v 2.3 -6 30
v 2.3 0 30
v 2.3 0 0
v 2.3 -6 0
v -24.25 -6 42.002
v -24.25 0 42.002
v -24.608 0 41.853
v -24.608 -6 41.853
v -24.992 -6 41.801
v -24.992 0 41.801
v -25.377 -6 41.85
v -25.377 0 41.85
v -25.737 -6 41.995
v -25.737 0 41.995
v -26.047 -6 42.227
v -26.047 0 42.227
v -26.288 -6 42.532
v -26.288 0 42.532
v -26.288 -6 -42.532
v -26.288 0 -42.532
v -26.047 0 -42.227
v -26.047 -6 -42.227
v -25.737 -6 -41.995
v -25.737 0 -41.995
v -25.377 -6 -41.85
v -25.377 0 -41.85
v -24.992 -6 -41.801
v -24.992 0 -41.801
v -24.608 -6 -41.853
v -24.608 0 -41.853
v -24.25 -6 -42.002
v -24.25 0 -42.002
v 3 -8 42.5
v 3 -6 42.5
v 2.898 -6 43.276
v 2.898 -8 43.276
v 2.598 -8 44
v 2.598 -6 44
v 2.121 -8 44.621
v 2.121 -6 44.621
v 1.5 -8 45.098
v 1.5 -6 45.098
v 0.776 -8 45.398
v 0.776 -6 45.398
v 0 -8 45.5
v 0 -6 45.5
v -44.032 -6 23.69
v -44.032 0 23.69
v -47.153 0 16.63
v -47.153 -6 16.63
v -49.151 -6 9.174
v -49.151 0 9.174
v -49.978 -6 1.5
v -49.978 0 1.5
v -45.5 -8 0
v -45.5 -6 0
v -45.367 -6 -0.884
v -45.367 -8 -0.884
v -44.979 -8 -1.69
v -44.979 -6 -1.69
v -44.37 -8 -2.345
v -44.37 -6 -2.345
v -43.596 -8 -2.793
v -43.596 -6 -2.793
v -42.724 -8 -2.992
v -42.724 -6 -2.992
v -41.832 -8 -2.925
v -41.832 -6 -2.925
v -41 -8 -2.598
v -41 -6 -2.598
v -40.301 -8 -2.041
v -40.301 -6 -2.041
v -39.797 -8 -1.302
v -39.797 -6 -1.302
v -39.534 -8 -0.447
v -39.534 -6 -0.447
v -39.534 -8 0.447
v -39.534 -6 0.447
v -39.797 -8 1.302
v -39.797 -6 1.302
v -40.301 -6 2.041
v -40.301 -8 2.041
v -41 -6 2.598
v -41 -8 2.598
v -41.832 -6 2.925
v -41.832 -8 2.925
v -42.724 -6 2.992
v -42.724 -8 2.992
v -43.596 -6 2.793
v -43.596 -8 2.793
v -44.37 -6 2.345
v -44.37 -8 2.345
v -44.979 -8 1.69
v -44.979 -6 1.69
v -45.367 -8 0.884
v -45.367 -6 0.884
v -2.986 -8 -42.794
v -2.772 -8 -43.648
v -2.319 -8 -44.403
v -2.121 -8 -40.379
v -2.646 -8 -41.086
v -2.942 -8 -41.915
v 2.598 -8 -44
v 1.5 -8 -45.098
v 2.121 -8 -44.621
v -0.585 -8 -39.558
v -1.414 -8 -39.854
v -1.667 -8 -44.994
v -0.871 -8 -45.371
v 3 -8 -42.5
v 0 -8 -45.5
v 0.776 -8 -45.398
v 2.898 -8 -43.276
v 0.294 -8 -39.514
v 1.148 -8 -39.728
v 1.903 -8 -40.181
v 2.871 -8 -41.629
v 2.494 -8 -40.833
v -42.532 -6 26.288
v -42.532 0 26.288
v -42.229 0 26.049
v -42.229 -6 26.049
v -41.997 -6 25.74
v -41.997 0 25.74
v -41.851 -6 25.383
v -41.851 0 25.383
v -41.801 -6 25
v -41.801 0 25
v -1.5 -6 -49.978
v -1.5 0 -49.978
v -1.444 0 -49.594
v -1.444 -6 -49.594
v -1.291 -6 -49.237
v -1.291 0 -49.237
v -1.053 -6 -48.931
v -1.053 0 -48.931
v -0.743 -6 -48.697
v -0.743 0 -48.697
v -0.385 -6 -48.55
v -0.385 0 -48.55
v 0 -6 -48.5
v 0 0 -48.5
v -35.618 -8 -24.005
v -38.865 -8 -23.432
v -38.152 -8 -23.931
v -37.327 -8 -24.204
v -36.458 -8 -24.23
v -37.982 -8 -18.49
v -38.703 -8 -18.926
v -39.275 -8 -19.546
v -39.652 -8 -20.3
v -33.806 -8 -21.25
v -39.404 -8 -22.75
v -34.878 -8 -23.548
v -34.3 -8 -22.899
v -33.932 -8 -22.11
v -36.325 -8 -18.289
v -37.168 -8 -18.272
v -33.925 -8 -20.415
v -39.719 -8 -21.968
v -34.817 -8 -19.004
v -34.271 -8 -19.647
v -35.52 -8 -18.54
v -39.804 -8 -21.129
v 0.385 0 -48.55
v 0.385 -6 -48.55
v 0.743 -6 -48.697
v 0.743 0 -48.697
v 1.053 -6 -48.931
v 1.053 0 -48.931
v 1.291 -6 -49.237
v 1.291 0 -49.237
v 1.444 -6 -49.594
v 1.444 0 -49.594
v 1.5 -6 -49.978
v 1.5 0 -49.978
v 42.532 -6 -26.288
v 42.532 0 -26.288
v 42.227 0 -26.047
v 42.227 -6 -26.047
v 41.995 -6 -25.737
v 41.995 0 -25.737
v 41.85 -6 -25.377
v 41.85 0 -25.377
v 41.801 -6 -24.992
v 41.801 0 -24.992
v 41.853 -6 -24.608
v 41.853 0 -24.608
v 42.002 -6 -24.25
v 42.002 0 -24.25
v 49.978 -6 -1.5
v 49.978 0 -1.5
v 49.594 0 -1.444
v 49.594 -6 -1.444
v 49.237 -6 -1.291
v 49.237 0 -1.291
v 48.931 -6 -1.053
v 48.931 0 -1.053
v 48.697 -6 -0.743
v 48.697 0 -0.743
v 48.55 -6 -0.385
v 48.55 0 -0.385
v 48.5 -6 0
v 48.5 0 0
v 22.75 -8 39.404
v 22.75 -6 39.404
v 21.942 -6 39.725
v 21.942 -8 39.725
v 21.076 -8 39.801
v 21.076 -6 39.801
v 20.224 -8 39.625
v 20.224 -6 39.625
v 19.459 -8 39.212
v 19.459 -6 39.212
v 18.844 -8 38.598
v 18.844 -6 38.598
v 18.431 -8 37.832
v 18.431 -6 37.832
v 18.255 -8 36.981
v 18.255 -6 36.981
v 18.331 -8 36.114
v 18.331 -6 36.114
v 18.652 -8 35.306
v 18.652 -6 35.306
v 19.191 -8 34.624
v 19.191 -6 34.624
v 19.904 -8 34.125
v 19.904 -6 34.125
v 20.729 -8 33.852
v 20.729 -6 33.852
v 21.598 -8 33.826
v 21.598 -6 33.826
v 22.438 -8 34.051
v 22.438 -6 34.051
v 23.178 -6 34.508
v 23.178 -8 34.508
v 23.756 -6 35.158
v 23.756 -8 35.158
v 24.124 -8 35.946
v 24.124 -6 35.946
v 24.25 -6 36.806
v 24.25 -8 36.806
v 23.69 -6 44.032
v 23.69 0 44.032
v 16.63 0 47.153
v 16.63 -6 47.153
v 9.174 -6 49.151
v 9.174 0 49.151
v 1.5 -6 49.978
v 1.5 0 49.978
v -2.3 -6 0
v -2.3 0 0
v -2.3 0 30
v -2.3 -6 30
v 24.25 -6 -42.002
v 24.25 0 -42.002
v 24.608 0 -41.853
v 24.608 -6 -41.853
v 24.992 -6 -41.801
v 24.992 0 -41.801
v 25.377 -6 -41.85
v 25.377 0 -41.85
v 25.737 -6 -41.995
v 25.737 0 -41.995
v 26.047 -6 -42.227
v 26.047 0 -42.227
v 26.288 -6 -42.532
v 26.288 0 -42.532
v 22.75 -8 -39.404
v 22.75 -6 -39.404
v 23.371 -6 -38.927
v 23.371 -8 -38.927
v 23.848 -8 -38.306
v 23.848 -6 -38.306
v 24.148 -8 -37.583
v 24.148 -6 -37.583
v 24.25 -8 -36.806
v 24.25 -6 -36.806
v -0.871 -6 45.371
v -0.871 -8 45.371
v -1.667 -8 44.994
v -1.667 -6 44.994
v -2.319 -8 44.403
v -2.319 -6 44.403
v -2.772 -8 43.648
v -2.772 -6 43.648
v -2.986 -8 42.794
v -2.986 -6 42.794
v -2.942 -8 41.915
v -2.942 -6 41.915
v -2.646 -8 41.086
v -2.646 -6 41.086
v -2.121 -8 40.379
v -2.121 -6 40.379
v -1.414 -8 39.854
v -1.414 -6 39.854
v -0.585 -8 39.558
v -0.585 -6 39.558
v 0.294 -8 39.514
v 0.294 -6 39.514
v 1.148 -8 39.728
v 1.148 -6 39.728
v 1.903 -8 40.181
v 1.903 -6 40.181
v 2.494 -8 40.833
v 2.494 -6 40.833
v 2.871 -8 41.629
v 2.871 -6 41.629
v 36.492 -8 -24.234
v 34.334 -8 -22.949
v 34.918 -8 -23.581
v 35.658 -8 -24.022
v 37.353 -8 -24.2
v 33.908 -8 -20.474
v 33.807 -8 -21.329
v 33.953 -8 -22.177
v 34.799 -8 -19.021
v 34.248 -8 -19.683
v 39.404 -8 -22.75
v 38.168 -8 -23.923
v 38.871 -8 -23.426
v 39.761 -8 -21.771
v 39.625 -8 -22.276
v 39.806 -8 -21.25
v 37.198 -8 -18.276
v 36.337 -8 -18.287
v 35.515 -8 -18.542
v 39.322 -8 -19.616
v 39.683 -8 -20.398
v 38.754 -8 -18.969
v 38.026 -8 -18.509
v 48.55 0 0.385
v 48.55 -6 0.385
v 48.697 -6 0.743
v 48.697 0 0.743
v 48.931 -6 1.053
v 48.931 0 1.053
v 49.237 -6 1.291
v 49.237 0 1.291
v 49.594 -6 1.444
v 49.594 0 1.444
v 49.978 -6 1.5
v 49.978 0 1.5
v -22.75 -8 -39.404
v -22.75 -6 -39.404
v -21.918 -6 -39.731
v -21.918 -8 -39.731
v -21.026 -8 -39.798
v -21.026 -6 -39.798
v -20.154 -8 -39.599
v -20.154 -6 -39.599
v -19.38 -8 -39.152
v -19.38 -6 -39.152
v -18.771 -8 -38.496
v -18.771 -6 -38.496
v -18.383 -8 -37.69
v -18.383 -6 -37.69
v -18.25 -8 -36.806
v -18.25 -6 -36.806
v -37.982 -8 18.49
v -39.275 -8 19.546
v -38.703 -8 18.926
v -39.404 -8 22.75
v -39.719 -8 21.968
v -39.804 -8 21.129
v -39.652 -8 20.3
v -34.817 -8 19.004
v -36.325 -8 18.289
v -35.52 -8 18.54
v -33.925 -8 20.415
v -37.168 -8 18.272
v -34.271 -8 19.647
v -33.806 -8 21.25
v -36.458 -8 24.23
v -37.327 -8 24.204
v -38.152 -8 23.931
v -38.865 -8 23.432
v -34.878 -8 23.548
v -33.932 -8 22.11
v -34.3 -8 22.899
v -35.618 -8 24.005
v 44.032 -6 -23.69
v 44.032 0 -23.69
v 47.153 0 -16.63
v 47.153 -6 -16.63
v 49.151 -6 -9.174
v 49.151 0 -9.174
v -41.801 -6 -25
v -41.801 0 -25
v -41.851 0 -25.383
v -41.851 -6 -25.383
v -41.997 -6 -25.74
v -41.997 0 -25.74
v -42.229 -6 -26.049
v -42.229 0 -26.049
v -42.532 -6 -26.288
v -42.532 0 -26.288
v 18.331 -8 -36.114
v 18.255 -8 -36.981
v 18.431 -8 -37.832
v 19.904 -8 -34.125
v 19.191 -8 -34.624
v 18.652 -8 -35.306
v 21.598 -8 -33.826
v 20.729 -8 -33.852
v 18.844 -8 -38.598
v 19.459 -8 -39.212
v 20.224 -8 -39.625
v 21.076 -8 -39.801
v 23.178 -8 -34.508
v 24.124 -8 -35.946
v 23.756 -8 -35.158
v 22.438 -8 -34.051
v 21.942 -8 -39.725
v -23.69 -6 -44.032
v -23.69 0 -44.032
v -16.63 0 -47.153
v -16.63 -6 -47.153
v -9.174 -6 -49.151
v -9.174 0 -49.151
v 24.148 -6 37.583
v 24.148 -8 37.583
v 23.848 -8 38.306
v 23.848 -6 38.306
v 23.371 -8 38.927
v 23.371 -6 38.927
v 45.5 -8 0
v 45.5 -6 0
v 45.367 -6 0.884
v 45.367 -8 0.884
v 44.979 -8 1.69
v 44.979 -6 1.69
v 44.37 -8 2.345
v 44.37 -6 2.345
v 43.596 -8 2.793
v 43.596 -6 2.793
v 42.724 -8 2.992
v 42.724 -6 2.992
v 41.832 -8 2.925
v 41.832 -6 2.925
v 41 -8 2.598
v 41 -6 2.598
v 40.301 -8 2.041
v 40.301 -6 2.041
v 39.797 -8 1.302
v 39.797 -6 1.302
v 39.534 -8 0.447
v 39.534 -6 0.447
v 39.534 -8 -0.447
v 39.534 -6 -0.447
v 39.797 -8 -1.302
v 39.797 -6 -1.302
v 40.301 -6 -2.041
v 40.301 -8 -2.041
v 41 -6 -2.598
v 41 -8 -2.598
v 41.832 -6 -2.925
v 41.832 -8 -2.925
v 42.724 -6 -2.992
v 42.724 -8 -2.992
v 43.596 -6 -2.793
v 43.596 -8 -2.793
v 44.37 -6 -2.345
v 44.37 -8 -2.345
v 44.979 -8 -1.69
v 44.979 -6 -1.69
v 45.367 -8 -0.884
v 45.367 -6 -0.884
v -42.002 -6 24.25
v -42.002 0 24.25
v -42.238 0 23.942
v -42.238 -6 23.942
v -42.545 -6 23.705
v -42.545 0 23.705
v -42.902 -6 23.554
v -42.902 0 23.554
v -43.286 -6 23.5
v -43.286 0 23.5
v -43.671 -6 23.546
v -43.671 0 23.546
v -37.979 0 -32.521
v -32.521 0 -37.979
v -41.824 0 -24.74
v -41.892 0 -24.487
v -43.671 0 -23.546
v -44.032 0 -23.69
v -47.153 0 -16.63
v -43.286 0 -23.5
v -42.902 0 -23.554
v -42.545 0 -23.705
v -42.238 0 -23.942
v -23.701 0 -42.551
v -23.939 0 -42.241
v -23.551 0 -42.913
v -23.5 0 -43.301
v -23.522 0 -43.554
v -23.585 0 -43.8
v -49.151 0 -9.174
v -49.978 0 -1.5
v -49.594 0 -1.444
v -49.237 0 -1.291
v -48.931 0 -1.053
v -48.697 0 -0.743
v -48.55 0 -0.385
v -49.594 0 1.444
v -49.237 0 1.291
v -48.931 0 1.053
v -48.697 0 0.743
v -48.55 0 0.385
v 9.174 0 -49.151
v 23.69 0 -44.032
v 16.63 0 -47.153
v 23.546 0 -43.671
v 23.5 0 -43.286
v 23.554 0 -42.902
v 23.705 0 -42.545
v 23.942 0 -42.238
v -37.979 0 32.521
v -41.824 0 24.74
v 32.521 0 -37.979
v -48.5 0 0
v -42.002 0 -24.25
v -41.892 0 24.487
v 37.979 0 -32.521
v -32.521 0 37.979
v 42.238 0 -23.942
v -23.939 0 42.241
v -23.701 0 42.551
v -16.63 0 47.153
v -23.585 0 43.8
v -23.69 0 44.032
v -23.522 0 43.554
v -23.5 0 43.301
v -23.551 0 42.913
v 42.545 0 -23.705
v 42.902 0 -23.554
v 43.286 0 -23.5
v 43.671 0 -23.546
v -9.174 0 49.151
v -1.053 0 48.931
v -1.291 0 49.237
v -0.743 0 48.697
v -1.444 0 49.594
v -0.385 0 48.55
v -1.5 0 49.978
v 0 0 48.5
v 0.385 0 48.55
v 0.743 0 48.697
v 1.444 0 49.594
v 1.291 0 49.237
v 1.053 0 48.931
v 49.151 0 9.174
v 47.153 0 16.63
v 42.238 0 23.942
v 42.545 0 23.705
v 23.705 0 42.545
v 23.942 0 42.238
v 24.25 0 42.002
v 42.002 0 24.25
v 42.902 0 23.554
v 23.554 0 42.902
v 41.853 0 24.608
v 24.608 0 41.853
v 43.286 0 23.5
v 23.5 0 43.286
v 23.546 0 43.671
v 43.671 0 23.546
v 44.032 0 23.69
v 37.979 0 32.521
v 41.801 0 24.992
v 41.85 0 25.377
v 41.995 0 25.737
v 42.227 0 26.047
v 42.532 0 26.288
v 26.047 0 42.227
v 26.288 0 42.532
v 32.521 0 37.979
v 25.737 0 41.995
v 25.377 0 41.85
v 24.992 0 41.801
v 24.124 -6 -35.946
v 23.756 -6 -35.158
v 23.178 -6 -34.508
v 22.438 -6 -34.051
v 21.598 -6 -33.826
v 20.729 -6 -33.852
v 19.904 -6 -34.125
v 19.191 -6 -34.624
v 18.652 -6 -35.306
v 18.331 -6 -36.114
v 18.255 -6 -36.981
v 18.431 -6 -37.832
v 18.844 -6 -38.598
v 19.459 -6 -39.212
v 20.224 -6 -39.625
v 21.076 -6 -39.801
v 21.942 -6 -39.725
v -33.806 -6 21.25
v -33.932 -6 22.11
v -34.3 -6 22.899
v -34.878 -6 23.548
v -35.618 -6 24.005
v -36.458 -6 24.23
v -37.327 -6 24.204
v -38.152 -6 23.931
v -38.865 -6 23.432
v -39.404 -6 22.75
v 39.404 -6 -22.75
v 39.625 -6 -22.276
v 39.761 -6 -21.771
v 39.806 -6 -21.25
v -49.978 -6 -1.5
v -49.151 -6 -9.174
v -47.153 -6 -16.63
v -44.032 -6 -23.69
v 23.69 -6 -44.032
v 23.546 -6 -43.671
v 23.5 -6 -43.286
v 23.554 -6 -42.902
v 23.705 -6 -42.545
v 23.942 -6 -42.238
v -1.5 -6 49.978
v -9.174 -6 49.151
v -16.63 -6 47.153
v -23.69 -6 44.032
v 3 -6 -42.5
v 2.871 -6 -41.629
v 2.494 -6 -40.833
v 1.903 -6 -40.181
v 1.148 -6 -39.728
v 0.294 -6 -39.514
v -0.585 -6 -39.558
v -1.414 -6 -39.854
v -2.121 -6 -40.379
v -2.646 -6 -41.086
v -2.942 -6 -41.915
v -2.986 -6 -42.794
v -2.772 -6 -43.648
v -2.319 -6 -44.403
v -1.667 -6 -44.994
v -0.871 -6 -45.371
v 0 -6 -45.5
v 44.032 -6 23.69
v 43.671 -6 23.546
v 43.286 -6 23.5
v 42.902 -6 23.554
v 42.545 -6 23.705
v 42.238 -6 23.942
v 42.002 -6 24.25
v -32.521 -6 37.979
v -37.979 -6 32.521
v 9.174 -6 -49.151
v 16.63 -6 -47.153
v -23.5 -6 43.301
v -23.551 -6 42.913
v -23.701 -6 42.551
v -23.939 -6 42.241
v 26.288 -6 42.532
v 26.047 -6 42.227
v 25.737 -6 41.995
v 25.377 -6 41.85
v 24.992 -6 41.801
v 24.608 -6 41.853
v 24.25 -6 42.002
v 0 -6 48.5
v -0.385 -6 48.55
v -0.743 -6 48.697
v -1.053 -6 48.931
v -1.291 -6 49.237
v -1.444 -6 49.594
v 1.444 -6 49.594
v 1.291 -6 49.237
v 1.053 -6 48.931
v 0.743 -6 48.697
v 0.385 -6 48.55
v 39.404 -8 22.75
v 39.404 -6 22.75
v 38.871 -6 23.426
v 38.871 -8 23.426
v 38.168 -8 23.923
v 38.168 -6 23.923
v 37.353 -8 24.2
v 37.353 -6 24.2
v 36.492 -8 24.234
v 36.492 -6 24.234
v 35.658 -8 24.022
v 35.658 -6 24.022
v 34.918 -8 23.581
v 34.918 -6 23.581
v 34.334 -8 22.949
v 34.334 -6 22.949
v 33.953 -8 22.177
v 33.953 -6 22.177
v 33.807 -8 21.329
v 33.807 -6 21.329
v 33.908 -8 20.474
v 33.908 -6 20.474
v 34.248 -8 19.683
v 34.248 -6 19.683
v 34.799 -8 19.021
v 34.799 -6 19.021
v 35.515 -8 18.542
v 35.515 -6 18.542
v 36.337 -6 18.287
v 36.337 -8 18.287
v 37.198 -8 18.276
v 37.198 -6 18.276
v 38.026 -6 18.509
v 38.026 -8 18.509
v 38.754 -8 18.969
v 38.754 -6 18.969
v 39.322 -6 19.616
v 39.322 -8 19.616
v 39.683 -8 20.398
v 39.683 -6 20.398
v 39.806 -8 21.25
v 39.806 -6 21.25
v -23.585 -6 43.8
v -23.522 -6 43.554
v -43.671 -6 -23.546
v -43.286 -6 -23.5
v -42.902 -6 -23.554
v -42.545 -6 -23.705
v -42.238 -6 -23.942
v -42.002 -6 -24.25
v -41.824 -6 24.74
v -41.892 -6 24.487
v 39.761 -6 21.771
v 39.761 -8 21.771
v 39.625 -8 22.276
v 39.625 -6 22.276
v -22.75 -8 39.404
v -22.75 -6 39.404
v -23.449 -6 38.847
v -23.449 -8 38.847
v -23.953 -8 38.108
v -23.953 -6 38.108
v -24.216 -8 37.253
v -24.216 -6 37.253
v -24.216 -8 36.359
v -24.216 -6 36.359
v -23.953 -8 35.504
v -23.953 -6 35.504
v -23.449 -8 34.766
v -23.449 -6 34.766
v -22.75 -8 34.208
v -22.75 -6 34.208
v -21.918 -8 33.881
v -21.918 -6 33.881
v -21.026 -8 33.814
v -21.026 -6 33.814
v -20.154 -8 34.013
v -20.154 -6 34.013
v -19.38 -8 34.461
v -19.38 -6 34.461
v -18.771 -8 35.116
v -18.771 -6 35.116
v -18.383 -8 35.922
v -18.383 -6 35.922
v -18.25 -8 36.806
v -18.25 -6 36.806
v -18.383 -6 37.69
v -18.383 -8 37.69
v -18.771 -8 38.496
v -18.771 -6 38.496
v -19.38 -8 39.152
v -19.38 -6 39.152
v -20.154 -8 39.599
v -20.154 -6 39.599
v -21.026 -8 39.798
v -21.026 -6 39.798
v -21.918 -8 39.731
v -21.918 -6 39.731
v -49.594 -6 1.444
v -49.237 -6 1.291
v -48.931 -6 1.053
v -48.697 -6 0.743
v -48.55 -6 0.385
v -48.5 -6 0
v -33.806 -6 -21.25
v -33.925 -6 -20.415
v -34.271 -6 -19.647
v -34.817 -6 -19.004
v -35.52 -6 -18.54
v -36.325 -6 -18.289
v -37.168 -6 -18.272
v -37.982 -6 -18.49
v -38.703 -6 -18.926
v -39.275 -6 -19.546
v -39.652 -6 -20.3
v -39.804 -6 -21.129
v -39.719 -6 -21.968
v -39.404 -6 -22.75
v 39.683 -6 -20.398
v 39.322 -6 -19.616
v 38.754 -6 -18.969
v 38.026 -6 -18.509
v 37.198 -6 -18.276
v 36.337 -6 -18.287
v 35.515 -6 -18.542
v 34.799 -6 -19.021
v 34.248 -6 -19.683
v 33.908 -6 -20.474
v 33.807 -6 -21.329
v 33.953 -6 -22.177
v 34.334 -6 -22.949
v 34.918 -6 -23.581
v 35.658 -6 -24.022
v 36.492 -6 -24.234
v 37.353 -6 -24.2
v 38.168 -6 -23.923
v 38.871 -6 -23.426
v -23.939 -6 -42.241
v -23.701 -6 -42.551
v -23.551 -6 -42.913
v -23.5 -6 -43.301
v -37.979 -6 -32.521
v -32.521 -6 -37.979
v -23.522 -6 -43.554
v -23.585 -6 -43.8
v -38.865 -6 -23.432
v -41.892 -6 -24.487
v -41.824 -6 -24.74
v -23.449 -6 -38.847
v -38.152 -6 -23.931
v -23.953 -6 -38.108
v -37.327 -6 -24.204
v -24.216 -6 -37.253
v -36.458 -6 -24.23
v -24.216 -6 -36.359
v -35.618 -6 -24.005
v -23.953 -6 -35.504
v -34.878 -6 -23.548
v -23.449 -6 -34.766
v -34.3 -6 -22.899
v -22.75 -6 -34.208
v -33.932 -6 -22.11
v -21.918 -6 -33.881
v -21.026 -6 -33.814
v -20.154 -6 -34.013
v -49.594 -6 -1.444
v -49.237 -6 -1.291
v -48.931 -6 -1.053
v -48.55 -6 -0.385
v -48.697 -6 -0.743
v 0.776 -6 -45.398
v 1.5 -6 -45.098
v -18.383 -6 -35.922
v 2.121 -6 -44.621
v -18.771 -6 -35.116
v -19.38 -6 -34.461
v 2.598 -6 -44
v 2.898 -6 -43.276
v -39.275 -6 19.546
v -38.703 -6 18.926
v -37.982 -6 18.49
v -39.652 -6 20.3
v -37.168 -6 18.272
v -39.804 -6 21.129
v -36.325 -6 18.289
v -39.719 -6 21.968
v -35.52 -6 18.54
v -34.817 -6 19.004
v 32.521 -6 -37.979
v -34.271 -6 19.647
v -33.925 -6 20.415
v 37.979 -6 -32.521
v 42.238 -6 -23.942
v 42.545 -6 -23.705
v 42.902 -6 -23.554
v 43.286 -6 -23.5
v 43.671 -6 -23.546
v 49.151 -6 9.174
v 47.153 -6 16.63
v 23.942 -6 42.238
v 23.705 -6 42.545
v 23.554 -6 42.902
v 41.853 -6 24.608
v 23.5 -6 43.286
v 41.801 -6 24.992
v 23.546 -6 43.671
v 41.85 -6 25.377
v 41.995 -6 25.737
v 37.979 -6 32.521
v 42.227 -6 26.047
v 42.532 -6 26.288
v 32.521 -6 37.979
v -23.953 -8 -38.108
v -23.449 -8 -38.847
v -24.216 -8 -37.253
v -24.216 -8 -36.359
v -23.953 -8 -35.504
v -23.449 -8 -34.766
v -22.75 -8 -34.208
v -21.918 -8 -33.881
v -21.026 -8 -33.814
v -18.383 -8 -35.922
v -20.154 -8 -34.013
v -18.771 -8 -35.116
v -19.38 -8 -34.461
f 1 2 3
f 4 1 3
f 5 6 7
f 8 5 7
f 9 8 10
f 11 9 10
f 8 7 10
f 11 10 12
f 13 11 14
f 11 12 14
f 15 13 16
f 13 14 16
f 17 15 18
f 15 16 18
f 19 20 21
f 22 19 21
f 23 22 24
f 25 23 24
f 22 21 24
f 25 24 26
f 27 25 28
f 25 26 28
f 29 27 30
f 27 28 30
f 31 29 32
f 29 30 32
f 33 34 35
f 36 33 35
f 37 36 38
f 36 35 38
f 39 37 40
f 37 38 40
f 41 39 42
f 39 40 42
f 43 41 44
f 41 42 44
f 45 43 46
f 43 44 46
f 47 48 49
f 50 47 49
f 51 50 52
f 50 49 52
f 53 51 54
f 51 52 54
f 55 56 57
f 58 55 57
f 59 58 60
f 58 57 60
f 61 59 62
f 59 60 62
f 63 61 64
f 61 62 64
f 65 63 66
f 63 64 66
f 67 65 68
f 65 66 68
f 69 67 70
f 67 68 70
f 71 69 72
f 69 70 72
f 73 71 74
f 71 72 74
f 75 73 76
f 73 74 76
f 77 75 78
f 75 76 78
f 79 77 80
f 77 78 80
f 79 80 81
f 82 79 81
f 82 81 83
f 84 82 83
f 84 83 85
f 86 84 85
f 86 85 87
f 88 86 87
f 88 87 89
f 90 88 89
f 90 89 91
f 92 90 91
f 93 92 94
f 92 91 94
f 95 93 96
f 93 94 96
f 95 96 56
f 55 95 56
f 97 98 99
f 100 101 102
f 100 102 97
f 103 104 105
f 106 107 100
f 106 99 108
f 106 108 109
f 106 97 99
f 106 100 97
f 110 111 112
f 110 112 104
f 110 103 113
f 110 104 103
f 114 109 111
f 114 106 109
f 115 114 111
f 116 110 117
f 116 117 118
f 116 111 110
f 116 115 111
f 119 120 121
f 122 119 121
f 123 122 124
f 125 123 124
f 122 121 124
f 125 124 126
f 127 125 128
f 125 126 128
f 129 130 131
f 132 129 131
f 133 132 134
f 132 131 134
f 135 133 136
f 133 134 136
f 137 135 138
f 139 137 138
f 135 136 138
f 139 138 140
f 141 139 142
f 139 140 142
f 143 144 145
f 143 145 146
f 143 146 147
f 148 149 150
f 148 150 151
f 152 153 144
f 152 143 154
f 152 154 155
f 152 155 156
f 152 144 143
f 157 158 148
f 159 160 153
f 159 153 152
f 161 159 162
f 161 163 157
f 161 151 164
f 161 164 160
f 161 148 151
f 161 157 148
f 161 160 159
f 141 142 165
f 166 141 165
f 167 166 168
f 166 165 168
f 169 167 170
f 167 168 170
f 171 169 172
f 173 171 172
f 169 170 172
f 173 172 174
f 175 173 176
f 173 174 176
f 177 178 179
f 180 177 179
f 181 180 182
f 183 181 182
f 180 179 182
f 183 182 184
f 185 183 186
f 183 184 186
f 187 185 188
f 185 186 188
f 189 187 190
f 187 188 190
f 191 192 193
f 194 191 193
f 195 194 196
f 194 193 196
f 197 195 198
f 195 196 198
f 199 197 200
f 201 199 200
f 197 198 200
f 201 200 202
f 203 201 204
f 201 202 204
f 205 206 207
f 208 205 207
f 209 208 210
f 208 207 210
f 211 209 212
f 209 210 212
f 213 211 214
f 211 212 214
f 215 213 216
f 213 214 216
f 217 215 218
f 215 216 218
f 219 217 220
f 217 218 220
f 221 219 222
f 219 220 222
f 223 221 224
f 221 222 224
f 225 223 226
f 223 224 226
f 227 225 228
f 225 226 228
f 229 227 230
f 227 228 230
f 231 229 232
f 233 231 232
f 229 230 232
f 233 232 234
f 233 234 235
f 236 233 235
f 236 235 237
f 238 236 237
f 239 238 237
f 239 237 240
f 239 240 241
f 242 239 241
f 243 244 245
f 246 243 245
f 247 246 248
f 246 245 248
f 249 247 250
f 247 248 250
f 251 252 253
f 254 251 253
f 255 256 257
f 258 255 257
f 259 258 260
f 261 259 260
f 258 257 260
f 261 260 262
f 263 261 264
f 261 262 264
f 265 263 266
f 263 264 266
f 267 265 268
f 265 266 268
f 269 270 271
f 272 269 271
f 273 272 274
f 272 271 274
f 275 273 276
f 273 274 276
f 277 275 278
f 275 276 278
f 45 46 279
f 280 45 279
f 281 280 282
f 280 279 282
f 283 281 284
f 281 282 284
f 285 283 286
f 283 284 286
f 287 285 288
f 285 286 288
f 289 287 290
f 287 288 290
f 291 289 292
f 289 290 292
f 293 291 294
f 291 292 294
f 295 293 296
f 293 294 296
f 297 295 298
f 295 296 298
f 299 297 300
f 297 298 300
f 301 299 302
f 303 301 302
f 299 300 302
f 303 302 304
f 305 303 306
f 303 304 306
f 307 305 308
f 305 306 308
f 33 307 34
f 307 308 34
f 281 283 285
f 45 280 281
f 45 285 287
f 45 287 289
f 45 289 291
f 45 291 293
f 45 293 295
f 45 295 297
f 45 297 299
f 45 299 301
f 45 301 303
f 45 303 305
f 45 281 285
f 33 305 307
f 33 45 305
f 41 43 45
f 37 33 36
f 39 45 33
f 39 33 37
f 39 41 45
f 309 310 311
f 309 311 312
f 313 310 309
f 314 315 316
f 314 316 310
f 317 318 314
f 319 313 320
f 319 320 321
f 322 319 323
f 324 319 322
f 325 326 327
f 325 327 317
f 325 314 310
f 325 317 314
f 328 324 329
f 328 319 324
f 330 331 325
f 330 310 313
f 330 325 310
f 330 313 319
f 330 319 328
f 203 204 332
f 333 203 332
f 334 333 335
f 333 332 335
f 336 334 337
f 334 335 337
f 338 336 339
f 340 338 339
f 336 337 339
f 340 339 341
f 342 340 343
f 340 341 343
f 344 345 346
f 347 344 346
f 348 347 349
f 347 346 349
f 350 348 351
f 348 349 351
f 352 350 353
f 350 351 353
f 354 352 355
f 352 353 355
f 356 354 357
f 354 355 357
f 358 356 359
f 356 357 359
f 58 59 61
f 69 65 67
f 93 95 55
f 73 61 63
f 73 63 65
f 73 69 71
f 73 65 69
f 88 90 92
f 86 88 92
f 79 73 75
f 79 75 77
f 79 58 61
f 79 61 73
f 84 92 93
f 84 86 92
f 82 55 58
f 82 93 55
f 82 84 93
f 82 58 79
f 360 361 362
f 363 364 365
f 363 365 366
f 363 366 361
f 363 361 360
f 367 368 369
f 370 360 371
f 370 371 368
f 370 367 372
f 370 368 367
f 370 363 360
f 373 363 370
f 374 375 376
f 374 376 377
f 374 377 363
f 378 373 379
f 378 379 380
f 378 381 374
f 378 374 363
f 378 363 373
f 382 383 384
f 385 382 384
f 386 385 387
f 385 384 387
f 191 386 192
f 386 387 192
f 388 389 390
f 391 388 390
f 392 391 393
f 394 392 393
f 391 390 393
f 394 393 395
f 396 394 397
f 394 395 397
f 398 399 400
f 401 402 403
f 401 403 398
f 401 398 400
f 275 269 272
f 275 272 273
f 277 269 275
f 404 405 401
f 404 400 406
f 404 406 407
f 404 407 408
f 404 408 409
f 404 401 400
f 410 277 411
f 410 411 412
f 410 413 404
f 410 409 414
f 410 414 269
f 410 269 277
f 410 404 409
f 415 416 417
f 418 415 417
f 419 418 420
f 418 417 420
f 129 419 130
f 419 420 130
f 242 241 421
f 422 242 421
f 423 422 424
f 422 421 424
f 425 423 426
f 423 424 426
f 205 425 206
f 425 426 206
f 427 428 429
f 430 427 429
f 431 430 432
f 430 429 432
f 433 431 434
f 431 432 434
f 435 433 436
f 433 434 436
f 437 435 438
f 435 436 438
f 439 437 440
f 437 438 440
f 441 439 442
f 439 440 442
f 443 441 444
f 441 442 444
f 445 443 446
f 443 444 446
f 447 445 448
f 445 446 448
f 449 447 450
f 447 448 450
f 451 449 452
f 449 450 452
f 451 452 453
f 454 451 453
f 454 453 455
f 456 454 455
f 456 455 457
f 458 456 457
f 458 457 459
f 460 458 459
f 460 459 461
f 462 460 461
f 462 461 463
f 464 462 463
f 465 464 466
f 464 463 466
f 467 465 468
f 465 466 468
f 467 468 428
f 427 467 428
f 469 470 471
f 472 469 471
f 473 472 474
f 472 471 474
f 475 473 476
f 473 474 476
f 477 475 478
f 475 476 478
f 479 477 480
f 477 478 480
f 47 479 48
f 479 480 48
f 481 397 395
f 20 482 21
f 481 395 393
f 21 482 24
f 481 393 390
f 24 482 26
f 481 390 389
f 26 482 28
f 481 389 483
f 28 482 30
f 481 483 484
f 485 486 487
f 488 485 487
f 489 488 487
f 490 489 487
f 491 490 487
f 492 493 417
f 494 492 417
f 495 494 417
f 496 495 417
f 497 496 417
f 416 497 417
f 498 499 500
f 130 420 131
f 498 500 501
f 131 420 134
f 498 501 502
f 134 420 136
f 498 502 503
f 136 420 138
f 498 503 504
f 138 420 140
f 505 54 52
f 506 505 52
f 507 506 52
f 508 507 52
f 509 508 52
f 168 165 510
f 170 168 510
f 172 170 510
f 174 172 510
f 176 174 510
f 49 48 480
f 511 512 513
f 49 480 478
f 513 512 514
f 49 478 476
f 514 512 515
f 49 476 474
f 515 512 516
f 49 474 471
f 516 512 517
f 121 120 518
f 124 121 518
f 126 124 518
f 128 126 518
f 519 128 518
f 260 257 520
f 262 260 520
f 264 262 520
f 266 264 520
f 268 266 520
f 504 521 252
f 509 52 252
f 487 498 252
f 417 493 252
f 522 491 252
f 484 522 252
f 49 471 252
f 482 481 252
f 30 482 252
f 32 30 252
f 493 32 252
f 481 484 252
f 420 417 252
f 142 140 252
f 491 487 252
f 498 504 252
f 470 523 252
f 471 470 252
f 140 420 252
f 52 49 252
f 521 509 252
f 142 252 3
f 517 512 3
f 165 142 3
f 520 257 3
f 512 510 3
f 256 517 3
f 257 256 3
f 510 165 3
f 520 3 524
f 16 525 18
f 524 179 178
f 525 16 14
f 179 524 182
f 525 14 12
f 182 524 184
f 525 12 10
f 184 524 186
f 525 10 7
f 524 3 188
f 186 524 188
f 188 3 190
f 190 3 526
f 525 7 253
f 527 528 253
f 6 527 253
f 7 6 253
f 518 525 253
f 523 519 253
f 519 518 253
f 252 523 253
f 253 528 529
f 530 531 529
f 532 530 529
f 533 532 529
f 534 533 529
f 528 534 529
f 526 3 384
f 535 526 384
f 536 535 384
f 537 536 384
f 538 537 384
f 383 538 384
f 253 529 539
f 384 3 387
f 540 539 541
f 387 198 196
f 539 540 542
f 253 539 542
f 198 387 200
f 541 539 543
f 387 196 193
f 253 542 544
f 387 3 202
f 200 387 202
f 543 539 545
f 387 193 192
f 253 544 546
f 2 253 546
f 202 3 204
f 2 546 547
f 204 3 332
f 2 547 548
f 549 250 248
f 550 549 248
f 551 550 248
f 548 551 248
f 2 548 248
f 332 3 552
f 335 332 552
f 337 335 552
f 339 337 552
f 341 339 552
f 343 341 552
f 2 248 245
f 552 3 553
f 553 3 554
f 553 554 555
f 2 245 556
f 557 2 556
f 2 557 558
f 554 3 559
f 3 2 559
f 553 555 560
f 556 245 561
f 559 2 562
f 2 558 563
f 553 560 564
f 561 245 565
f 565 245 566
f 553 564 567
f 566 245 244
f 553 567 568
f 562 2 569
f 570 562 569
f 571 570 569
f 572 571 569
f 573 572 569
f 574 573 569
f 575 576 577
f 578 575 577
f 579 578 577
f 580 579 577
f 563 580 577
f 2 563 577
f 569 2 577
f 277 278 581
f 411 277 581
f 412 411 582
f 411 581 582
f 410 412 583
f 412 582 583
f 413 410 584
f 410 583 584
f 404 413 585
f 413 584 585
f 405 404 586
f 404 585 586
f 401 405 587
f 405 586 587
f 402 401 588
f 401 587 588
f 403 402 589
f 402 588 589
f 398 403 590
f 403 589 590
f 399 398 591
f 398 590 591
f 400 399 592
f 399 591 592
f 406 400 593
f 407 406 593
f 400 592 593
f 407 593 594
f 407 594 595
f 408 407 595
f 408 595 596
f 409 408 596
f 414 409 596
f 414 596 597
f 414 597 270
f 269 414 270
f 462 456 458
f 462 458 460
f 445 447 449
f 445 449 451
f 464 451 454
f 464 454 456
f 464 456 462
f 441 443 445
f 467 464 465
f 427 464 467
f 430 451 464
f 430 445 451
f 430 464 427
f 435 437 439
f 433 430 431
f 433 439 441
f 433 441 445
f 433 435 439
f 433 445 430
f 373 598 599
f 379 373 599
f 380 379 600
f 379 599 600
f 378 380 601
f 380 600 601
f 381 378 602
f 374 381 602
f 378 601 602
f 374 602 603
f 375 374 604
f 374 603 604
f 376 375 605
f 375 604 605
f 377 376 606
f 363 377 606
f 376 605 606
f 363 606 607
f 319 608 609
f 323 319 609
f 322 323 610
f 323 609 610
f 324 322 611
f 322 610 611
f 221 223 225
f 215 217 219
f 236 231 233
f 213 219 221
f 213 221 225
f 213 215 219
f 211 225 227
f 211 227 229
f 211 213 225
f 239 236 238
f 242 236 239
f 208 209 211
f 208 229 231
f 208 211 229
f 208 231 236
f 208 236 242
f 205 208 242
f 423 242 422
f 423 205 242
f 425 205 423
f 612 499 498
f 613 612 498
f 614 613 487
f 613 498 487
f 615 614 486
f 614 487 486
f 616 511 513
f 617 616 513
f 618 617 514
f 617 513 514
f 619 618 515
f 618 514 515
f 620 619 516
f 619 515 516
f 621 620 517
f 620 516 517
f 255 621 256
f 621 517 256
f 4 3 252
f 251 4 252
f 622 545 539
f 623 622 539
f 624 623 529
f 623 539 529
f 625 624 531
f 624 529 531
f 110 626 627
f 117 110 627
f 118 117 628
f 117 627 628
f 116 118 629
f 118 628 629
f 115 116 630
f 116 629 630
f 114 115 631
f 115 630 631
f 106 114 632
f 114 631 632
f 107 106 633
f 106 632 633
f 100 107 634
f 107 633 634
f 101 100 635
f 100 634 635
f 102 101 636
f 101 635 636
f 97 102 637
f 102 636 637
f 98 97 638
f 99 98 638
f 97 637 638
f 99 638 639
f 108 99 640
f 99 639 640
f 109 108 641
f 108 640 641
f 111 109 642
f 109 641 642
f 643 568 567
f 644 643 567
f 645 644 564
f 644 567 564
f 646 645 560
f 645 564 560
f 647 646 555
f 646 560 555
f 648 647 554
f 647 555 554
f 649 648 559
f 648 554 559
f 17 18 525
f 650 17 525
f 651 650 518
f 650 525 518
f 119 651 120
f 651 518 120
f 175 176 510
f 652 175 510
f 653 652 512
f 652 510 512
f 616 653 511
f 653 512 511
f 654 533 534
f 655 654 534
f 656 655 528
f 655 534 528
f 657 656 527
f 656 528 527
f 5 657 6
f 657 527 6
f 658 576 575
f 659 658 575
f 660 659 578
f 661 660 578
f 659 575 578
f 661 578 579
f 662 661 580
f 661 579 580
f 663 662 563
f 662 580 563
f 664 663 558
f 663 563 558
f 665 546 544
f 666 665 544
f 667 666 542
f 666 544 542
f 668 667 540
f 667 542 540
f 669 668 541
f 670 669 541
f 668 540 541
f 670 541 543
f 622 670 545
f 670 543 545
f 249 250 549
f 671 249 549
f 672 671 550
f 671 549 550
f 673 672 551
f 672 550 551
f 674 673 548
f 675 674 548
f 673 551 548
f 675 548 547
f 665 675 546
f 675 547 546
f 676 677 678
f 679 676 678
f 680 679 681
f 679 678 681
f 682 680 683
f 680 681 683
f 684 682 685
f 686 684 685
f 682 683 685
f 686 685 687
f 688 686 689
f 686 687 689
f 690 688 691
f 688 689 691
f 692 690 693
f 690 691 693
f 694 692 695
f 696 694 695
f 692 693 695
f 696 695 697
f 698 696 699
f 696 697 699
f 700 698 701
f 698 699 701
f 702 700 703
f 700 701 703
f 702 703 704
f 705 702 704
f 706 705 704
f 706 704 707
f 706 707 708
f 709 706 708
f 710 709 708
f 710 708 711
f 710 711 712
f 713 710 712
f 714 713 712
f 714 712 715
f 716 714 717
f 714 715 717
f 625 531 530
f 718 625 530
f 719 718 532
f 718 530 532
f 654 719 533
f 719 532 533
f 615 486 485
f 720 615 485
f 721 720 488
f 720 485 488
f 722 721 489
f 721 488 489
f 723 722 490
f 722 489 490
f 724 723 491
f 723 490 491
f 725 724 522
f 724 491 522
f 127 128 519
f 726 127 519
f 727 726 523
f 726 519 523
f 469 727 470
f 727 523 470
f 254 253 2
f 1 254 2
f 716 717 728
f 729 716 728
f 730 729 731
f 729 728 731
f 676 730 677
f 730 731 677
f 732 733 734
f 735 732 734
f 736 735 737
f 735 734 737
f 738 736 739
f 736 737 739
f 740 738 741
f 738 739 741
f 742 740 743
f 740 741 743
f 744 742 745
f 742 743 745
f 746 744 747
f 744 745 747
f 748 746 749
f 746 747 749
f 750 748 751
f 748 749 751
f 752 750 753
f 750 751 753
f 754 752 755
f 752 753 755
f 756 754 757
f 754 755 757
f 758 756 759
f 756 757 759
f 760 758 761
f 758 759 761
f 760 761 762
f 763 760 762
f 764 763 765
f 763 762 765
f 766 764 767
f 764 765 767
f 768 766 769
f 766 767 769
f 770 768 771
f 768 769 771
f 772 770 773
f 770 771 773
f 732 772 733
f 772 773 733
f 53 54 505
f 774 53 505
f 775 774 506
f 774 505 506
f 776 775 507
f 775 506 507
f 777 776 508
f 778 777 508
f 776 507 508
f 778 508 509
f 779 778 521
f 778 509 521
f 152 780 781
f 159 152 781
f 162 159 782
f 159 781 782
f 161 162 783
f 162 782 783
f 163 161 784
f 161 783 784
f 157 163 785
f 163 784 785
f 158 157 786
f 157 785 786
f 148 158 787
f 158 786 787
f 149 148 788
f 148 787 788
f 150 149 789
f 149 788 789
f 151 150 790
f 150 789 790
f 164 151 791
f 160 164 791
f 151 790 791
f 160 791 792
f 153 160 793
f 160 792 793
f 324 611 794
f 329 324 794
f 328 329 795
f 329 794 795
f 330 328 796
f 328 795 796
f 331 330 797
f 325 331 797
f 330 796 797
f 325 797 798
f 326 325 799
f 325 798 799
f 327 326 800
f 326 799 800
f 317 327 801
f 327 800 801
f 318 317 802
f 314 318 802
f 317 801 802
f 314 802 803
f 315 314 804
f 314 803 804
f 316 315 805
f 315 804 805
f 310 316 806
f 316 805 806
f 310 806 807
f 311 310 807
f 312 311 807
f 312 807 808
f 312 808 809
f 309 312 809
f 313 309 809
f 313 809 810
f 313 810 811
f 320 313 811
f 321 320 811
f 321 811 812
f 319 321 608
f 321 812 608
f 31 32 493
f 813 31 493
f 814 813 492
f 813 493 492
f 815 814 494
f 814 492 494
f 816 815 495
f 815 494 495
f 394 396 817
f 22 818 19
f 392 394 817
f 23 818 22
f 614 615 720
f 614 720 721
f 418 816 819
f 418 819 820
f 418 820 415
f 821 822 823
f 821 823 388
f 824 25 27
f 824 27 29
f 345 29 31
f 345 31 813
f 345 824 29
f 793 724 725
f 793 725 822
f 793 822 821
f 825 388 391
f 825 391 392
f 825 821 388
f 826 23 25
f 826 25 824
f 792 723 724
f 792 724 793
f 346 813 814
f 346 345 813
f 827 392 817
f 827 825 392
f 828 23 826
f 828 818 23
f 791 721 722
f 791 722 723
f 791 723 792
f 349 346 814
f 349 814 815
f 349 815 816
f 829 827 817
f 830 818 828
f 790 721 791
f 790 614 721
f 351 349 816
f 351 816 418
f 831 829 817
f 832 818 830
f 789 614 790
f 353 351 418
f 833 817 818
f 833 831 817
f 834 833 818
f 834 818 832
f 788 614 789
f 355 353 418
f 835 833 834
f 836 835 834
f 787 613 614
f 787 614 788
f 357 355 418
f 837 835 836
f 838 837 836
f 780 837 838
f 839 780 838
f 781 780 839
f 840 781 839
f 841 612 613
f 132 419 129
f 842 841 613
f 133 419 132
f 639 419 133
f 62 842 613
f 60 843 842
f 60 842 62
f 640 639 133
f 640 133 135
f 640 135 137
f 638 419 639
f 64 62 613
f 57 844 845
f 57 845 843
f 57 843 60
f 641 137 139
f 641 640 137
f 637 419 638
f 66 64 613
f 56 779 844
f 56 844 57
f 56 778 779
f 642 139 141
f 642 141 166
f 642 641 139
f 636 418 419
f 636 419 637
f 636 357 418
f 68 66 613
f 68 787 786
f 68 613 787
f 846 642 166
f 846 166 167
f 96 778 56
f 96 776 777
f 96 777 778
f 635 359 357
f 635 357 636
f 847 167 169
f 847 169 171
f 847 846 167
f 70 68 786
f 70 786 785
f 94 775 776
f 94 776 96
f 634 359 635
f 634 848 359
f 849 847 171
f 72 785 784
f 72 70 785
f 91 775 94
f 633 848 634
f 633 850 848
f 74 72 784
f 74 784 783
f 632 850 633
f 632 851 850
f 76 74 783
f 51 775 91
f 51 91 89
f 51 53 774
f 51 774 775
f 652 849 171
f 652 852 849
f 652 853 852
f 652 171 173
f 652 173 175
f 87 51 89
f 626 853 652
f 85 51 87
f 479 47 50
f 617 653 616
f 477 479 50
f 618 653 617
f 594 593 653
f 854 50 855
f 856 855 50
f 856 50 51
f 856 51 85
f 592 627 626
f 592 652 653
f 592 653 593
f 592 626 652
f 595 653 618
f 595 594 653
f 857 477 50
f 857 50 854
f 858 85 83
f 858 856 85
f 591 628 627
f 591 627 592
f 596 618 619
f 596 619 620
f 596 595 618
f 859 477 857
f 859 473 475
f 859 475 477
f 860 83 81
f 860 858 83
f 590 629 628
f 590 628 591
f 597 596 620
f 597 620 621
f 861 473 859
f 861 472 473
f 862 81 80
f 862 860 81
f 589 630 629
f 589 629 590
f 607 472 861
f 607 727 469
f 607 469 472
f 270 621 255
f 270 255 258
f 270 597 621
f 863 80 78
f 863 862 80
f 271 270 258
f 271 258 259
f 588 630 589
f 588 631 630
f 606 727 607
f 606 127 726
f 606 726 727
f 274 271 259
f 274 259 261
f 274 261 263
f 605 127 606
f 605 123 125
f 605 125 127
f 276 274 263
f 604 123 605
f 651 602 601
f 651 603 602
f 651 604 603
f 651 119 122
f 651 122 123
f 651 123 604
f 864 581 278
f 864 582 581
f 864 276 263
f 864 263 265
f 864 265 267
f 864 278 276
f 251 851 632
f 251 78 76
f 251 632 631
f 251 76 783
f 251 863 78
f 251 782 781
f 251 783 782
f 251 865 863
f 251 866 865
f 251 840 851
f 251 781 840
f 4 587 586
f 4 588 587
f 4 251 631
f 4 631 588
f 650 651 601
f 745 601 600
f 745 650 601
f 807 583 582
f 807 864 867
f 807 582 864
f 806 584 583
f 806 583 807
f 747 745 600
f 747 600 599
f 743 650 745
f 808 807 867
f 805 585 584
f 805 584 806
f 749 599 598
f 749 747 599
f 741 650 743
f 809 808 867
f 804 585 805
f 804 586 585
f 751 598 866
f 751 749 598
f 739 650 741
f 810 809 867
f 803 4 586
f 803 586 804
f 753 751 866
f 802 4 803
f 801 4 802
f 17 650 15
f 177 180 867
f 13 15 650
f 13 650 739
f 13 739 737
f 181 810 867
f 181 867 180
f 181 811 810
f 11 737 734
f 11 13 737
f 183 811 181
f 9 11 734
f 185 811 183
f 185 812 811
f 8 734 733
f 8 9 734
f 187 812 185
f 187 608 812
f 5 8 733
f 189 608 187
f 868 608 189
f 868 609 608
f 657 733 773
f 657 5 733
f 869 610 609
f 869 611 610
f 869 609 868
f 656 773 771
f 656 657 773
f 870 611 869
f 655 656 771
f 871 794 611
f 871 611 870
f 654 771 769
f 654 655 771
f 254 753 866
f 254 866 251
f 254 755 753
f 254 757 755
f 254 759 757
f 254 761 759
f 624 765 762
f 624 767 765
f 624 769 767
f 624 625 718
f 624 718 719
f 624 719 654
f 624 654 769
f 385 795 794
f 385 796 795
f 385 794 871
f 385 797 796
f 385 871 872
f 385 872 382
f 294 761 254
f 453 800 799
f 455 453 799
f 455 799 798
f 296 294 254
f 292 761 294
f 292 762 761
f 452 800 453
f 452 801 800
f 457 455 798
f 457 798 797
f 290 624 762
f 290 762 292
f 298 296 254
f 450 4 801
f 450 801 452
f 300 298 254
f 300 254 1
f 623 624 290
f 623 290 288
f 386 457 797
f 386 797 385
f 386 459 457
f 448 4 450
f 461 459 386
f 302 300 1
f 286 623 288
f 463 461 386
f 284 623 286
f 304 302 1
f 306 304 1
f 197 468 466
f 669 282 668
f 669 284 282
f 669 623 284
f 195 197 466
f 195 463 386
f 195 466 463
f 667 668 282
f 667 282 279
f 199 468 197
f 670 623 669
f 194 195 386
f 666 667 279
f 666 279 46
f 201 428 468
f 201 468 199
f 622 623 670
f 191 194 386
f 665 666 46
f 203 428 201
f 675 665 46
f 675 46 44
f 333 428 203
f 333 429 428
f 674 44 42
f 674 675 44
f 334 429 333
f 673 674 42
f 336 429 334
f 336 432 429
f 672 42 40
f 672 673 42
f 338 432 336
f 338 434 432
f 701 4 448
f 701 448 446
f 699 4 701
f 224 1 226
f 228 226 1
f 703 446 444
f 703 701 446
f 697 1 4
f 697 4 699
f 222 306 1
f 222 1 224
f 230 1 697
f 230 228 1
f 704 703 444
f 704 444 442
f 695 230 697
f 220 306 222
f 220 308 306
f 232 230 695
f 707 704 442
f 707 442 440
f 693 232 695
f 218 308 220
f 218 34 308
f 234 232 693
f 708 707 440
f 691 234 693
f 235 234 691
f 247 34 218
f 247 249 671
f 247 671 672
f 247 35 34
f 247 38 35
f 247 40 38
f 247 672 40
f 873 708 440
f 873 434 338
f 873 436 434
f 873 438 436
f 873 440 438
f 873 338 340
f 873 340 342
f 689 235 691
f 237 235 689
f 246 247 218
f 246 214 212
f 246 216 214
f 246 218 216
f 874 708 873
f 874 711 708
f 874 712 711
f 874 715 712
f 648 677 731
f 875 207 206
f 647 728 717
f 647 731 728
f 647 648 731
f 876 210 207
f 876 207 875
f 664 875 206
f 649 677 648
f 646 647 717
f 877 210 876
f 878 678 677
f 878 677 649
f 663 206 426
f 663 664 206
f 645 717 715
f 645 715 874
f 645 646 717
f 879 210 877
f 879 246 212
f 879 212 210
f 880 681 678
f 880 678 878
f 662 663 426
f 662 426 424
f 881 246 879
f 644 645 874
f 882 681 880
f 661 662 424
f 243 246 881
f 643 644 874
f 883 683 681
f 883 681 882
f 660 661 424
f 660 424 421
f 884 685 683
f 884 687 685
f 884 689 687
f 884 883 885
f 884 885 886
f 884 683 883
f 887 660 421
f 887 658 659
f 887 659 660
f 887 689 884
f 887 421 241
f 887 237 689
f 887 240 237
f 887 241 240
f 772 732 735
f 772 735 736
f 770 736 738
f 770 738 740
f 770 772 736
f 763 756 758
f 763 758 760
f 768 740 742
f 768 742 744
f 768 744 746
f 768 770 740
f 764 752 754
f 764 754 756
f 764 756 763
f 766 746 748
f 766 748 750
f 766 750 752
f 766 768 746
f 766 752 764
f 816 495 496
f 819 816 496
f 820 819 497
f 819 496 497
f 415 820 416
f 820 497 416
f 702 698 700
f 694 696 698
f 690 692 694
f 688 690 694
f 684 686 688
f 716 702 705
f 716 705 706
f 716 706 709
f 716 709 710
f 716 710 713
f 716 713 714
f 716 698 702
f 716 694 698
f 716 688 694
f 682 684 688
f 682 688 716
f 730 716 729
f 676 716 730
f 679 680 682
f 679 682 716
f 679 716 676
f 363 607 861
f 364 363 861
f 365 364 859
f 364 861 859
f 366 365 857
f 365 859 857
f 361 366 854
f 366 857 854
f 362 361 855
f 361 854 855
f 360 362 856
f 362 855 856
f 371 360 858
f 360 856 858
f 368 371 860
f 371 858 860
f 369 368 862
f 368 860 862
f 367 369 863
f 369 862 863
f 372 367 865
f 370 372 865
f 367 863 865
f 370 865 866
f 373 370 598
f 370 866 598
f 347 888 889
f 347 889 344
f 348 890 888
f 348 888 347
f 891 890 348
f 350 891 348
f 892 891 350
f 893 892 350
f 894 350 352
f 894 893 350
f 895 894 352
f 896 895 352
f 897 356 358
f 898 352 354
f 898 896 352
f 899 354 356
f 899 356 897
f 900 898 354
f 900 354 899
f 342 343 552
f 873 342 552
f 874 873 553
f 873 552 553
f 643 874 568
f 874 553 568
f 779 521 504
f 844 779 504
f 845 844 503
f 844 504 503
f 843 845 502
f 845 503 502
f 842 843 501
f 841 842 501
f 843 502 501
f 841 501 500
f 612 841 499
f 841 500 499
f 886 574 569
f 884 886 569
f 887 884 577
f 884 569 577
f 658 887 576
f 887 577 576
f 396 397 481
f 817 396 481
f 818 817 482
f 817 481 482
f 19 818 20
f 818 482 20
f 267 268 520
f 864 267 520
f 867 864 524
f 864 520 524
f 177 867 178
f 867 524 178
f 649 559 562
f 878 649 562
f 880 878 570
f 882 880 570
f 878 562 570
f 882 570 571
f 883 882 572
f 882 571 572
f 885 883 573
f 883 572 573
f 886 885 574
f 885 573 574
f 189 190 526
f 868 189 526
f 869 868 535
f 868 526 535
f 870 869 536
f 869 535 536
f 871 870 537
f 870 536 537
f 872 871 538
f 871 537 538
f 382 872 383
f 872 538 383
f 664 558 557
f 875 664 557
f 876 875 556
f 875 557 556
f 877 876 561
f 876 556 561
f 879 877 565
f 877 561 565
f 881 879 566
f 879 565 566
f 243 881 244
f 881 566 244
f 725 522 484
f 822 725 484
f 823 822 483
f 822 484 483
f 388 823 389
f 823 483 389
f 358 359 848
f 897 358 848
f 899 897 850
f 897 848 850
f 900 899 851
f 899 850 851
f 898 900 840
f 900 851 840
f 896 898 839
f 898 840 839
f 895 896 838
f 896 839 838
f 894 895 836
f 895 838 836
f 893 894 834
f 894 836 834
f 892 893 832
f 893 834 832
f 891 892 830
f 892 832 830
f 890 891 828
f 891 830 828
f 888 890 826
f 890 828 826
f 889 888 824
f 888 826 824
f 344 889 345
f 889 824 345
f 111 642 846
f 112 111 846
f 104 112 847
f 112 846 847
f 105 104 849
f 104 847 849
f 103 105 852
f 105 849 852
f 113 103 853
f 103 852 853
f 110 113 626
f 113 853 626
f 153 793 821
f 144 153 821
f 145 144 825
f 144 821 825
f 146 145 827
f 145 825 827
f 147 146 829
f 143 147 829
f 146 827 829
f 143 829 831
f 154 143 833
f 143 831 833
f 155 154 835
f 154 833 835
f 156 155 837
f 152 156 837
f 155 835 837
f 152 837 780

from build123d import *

# Parameters (mm, degrees)
F1_DEPTH = 6
F2_R     = 3
F3_DEPTH = 2


with BuildPart() as f1:
    # F0 (on Front) → F1 (new body)
    with BuildSketch(Plane.XZ):
        with BuildLine():
            Line((-42.0022320835, 24.25), (-2.3, 1.3279056191))
            Line((-2.3, 1.3279056191), (-2.3, 3.9837168574))
            Line((-2.3, 3.9837168574), (-24.25, 42.0022320835))
            ThreePointArc((-24.25, 42.0022320835), (-25.3773506768, 41.8495104065), (-26.2876419557, 42.5318689974))
            ThreePointArc((-26.2876419557, 42.5318689974), (-35.3553390593, 35.3553390593), (-42.5318689974, 26.2876419557))
            ThreePointArc((-42.5318689974, 26.2876419557), (-41.9966434633, 25.7402358449), (-41.8012701892, 25))
            ThreePointArc((-41.8012701892, 25), (-41.8523814498, 24.6117714323), (-42.0022320835, 24.25))
        make_face()
        with BuildLine():
            Line((-2.3, 30), (0, 30))
            Line((0, 30), (0, 48.5))
            ThreePointArc((0, 48.5), (-1.0526751636, 48.9314144863), (-1.4998312405, 49.9775))
            ThreePointArc((-1.4998312405, 49.9775), (-12.9409522551, 48.2962913145), (-23.6898580443, 44.0317002379))
            ThreePointArc((-23.6898580443, 44.0317002379), (-23.5482402173, 43.678620866), (-23.5, 43.3012701892))
            ThreePointArc((-23.5, 43.3012701892), (-23.7009618943, 42.5512701892), (-24.25, 42.0022320835))
            Line((-24.25, 42.0022320835), (-2.3, 3.9837168574))
            Line((-2.3, 3.9837168574), (-2.3, 30))
        make_face()
        with BuildLine():
            Line((0, 48.5), (0, 30))
            Line((0, 30), (2.3, 30))
            Line((2.3, 30), (2.3, 3.9837168574))
            Line((2.3, 3.9837168574), (24.25, 42.0022320835))
            ThreePointArc((24.25, 42.0022320835), (23.5540638096, 42.9021855701), (23.6898580443, 44.0317002379))
            ThreePointArc((23.6898580443, 44.0317002379), (12.9409522551, 48.2962913145), (1.4998312405, 49.9775))
            ThreePointArc((1.4998312405, 49.9775), (1.0526751636, 48.9314144863), (0, 48.5))
        make_face()
        with BuildLine():
            Line((2.3, 1.3279056191), (42.0022320835, 24.25))
            ThreePointArc((42.0022320835, 24.25), (41.8495104065, 25.3773506768), (42.5318689974, 26.2876419557))
            ThreePointArc((42.5318689974, 26.2876419557), (35.3553390593, 35.3553390593), (26.2876419557, 42.5318689974))
            ThreePointArc((26.2876419557, 42.5318689974), (25.3773506768, 41.8495104065), (24.25, 42.0022320835))
            Line((24.25, 42.0022320835), (2.3, 3.9837168574))
            Line((2.3, 3.9837168574), (2.3, 1.3279056191))
        make_face()
        with BuildLine():
            ThreePointArc((48.5, 0), (48.9314144863, 1.0526751636), (49.9775, 1.4998312405))
            ThreePointArc((49.9775, 1.4998312405), (48.2962913145, 12.9409522551), (44.0317002379, 23.6898580443))
            ThreePointArc((44.0317002379, 23.6898580443), (42.9021855701, 23.5540638096), (42.0022320835, 24.25))
            Line((42.0022320835, 24.25), (2.3, 1.3279056191))
            Line((2.3, 1.3279056191), (2.3, 0))
            Line((2.3, 0), (48.5, 0))
        make_face()
        with BuildLine():
            ThreePointArc((44.0317002379, -23.6898580443), (48.2962913145, -12.9409522551), (49.9775, -1.4998312405))
            ThreePointArc((49.9775, -1.4998312405), (48.9314144863, -1.0526751636), (48.5, 0))
            Line((48.5, 0), (2.3, 0))
            Line((2.3, 0), (0, 0))
            Line((0, 0), (42.0022320835, -24.25))
            ThreePointArc((42.0022320835, -24.25), (42.9021855701, -23.5540638096), (44.0317002379, -23.6898580443))
        make_face()
        with BuildLine():
            ThreePointArc((42.5318689974, -26.2876419557), (41.8495104065, -25.3773506768), (42.0022320835, -24.25))
            Line((42.0022320835, -24.25), (0, 0))
            Line((0, 0), (24.25, -42.0022320835))
            ThreePointArc((24.25, -42.0022320835), (25.3773506768, -41.8495104065), (26.2876419557, -42.5318689974))
            ThreePointArc((26.2876419557, -42.5318689974), (35.3553390593, -35.3553390593), (42.5318689974, -26.2876419557))
        make_face()
        with BuildLine():
            Line((24.25, -42.0022320835), (0, 0))
            Line((0, 0), (0, -48.5))
            ThreePointArc((0, -48.5), (1.0526751636, -48.9314144863), (1.4998312405, -49.9775))
            ThreePointArc((1.4998312405, -49.9775), (12.9409522551, -48.2962913145), (23.6898580443, -44.0317002379))
            ThreePointArc((23.6898580443, -44.0317002379), (23.5540638096, -42.9021855701), (24.25, -42.0022320835))
        make_face()
        with BuildLine():
            Line((0, -48.5), (0, 0))
            Line((0, 0), (-24.25, -42.0022320835))
            ThreePointArc((-24.25, -42.0022320835), (-23.7009618943, -42.5512701892), (-23.5, -43.3012701892))
            ThreePointArc((-23.5, -43.3012701892), (-23.5482402173, -43.678620866), (-23.6898580443, -44.0317002379))
            ThreePointArc((-23.6898580443, -44.0317002379), (-12.9409522551, -48.2962913145), (-1.4998312405, -49.9775))
            ThreePointArc((-1.4998312405, -49.9775), (-1.0526751636, -48.9314144863), (0, -48.5))
        make_face()
        with BuildLine():
            Line((-24.25, -42.0022320835), (0, 0))
            Line((0, 0), (-42.0022320835, -24.25))
            ThreePointArc((-42.0022320835, -24.25), (-41.8523814498, -24.6117714323), (-41.8012701892, -25))
            ThreePointArc((-41.8012701892, -25), (-41.9966434633, -25.7402358449), (-42.5318689974, -26.2876419557))
            ThreePointArc((-42.5318689974, -26.2876419557), (-35.3553390593, -35.3553390593), (-26.2876419557, -42.5318689974))
            ThreePointArc((-26.2876419557, -42.5318689974), (-25.3773506768, -41.8495104065), (-24.25, -42.0022320835))
        make_face()
        with BuildLine():
            Line((-42.0022320835, -24.25), (0, 0))
            Line((0, 0), (-2.3, 0))
            Line((-2.3, 0), (-48.5, 0))
            ThreePointArc((-48.5, 0), (-48.9314144863, -1.0526751636), (-49.9775, -1.4998312405))
            ThreePointArc((-49.9775, -1.4998312405), (-48.2962913145, -12.9409522551), (-44.0317002379, -23.6898580443))
            ThreePointArc((-44.0317002379, -23.6898580443), (-42.9021855701, -23.5540638096), (-42.0022320835, -24.25))
        make_face()
        with BuildLine():
            Line((-48.5, 0), (-2.3, 0))
            Line((-2.3, 0), (-2.3, 1.3279056191))
            Line((-2.3, 1.3279056191), (-42.0022320835, 24.25))
            ThreePointArc((-42.0022320835, 24.25), (-42.9021855701, 23.5540638096), (-44.0317002379, 23.6898580443))
            ThreePointArc((-44.0317002379, 23.6898580443), (-48.2962913145, 12.9409522551), (-49.9775, 1.4998312405))
            ThreePointArc((-49.9775, 1.4998312405), (-48.9314144863, 1.0526751636), (-48.5, 0))
        make_face()
    extrude(amount=F1_DEPTH)

    # F2 (on face) → F3 (join)
    with BuildSketch(Plane.XZ.offset(6)):
        with BuildLine():
            ThreePointArc((3, 42.5), (2.1213203436, 44.6213203436), (0, 45.5))
            ThreePointArc((0, 45.5), (-2.1213203436, 40.3786796564), (3, 42.5))
        make_face()
        with BuildLine():
            ThreePointArc((24.25, 36.8060796608), (23.8480762114, 38.3060796608), (22.75, 39.4041558722))
            ThreePointArc((22.75, 39.4041558722), (18.6519237886, 35.3060796608), (24.25, 36.8060796608))
        make_face()
        with BuildLine():
            ThreePointArc((39.8060796608, 21.25), (39.7038571397, 22.0264571353), (39.4041558722, 22.75))
            ThreePointArc((39.4041558722, 22.75), (33.908302182, 20.4735428647), (39.8060796608, 21.25))
        make_face()
        with Locations((42.5, 0)):
            Circle(F2_R)
        with BuildLine():
            ThreePointArc((39.8060796608, -21.25), (33.908302182, -20.4735428647), (39.4041558722, -22.75))
            ThreePointArc((39.4041558722, -22.75), (39.7038571397, -22.0264571353), (39.8060796608, -21.25))
        make_face()
        with BuildLine():
            ThreePointArc((24.25, -36.8060796608), (18.6519237886, -35.3060796608), (22.75, -39.4041558722))
            ThreePointArc((22.75, -39.4041558722), (23.8480762114, -38.3060796608), (24.25, -36.8060796608))
        make_face()
        with BuildLine():
            ThreePointArc((3, -42.5), (-2.1213203436, -40.3786796564), (0, -45.5))
            ThreePointArc((0, -45.5), (2.1213203436, -44.6213203436), (3, -42.5))
        make_face()
        with BuildLine():
            ThreePointArc((-18.25, -36.8060796608), (-22.75, -34.2080034495), (-22.75, -39.4041558722))
            ThreePointArc((-22.75, -39.4041558722), (-19.75, -39.4041558722), (-18.25, -36.8060796608))
        make_face()
        with BuildLine():
            ThreePointArc((-33.8060796608, -21.25), (-37.5825367961, -18.3522225211), (-39.4041558722, -22.75))
            ThreePointArc((-39.4041558722, -22.75), (-36.0296225255, -24.1477774789), (-33.8060796608, -21.25))
        make_face()
        with BuildLine():
            ThreePointArc((-39.5, 0), (-42.5, 3), (-45.5, 0))
            ThreePointArc((-45.5, 0), (-42.5, -3), (-39.5, 0))
        make_face()
        with BuildLine():
            ThreePointArc((-33.8060796608, 21.25), (-36.0296225255, 24.1477774789), (-39.4041558722, 22.75))
            ThreePointArc((-39.4041558722, 22.75), (-37.5825367961, 18.3522225211), (-33.8060796608, 21.25))
        make_face()
        with BuildLine():
            ThreePointArc((-18.25, 36.8060796608), (-19.75, 39.4041558722), (-22.75, 39.4041558722))
            ThreePointArc((-22.75, 39.4041558722), (-22.75, 34.2080034495), (-18.25, 36.8060796608))
        make_face()
    extrude(amount=F3_DEPTH)


solid = f1.part
